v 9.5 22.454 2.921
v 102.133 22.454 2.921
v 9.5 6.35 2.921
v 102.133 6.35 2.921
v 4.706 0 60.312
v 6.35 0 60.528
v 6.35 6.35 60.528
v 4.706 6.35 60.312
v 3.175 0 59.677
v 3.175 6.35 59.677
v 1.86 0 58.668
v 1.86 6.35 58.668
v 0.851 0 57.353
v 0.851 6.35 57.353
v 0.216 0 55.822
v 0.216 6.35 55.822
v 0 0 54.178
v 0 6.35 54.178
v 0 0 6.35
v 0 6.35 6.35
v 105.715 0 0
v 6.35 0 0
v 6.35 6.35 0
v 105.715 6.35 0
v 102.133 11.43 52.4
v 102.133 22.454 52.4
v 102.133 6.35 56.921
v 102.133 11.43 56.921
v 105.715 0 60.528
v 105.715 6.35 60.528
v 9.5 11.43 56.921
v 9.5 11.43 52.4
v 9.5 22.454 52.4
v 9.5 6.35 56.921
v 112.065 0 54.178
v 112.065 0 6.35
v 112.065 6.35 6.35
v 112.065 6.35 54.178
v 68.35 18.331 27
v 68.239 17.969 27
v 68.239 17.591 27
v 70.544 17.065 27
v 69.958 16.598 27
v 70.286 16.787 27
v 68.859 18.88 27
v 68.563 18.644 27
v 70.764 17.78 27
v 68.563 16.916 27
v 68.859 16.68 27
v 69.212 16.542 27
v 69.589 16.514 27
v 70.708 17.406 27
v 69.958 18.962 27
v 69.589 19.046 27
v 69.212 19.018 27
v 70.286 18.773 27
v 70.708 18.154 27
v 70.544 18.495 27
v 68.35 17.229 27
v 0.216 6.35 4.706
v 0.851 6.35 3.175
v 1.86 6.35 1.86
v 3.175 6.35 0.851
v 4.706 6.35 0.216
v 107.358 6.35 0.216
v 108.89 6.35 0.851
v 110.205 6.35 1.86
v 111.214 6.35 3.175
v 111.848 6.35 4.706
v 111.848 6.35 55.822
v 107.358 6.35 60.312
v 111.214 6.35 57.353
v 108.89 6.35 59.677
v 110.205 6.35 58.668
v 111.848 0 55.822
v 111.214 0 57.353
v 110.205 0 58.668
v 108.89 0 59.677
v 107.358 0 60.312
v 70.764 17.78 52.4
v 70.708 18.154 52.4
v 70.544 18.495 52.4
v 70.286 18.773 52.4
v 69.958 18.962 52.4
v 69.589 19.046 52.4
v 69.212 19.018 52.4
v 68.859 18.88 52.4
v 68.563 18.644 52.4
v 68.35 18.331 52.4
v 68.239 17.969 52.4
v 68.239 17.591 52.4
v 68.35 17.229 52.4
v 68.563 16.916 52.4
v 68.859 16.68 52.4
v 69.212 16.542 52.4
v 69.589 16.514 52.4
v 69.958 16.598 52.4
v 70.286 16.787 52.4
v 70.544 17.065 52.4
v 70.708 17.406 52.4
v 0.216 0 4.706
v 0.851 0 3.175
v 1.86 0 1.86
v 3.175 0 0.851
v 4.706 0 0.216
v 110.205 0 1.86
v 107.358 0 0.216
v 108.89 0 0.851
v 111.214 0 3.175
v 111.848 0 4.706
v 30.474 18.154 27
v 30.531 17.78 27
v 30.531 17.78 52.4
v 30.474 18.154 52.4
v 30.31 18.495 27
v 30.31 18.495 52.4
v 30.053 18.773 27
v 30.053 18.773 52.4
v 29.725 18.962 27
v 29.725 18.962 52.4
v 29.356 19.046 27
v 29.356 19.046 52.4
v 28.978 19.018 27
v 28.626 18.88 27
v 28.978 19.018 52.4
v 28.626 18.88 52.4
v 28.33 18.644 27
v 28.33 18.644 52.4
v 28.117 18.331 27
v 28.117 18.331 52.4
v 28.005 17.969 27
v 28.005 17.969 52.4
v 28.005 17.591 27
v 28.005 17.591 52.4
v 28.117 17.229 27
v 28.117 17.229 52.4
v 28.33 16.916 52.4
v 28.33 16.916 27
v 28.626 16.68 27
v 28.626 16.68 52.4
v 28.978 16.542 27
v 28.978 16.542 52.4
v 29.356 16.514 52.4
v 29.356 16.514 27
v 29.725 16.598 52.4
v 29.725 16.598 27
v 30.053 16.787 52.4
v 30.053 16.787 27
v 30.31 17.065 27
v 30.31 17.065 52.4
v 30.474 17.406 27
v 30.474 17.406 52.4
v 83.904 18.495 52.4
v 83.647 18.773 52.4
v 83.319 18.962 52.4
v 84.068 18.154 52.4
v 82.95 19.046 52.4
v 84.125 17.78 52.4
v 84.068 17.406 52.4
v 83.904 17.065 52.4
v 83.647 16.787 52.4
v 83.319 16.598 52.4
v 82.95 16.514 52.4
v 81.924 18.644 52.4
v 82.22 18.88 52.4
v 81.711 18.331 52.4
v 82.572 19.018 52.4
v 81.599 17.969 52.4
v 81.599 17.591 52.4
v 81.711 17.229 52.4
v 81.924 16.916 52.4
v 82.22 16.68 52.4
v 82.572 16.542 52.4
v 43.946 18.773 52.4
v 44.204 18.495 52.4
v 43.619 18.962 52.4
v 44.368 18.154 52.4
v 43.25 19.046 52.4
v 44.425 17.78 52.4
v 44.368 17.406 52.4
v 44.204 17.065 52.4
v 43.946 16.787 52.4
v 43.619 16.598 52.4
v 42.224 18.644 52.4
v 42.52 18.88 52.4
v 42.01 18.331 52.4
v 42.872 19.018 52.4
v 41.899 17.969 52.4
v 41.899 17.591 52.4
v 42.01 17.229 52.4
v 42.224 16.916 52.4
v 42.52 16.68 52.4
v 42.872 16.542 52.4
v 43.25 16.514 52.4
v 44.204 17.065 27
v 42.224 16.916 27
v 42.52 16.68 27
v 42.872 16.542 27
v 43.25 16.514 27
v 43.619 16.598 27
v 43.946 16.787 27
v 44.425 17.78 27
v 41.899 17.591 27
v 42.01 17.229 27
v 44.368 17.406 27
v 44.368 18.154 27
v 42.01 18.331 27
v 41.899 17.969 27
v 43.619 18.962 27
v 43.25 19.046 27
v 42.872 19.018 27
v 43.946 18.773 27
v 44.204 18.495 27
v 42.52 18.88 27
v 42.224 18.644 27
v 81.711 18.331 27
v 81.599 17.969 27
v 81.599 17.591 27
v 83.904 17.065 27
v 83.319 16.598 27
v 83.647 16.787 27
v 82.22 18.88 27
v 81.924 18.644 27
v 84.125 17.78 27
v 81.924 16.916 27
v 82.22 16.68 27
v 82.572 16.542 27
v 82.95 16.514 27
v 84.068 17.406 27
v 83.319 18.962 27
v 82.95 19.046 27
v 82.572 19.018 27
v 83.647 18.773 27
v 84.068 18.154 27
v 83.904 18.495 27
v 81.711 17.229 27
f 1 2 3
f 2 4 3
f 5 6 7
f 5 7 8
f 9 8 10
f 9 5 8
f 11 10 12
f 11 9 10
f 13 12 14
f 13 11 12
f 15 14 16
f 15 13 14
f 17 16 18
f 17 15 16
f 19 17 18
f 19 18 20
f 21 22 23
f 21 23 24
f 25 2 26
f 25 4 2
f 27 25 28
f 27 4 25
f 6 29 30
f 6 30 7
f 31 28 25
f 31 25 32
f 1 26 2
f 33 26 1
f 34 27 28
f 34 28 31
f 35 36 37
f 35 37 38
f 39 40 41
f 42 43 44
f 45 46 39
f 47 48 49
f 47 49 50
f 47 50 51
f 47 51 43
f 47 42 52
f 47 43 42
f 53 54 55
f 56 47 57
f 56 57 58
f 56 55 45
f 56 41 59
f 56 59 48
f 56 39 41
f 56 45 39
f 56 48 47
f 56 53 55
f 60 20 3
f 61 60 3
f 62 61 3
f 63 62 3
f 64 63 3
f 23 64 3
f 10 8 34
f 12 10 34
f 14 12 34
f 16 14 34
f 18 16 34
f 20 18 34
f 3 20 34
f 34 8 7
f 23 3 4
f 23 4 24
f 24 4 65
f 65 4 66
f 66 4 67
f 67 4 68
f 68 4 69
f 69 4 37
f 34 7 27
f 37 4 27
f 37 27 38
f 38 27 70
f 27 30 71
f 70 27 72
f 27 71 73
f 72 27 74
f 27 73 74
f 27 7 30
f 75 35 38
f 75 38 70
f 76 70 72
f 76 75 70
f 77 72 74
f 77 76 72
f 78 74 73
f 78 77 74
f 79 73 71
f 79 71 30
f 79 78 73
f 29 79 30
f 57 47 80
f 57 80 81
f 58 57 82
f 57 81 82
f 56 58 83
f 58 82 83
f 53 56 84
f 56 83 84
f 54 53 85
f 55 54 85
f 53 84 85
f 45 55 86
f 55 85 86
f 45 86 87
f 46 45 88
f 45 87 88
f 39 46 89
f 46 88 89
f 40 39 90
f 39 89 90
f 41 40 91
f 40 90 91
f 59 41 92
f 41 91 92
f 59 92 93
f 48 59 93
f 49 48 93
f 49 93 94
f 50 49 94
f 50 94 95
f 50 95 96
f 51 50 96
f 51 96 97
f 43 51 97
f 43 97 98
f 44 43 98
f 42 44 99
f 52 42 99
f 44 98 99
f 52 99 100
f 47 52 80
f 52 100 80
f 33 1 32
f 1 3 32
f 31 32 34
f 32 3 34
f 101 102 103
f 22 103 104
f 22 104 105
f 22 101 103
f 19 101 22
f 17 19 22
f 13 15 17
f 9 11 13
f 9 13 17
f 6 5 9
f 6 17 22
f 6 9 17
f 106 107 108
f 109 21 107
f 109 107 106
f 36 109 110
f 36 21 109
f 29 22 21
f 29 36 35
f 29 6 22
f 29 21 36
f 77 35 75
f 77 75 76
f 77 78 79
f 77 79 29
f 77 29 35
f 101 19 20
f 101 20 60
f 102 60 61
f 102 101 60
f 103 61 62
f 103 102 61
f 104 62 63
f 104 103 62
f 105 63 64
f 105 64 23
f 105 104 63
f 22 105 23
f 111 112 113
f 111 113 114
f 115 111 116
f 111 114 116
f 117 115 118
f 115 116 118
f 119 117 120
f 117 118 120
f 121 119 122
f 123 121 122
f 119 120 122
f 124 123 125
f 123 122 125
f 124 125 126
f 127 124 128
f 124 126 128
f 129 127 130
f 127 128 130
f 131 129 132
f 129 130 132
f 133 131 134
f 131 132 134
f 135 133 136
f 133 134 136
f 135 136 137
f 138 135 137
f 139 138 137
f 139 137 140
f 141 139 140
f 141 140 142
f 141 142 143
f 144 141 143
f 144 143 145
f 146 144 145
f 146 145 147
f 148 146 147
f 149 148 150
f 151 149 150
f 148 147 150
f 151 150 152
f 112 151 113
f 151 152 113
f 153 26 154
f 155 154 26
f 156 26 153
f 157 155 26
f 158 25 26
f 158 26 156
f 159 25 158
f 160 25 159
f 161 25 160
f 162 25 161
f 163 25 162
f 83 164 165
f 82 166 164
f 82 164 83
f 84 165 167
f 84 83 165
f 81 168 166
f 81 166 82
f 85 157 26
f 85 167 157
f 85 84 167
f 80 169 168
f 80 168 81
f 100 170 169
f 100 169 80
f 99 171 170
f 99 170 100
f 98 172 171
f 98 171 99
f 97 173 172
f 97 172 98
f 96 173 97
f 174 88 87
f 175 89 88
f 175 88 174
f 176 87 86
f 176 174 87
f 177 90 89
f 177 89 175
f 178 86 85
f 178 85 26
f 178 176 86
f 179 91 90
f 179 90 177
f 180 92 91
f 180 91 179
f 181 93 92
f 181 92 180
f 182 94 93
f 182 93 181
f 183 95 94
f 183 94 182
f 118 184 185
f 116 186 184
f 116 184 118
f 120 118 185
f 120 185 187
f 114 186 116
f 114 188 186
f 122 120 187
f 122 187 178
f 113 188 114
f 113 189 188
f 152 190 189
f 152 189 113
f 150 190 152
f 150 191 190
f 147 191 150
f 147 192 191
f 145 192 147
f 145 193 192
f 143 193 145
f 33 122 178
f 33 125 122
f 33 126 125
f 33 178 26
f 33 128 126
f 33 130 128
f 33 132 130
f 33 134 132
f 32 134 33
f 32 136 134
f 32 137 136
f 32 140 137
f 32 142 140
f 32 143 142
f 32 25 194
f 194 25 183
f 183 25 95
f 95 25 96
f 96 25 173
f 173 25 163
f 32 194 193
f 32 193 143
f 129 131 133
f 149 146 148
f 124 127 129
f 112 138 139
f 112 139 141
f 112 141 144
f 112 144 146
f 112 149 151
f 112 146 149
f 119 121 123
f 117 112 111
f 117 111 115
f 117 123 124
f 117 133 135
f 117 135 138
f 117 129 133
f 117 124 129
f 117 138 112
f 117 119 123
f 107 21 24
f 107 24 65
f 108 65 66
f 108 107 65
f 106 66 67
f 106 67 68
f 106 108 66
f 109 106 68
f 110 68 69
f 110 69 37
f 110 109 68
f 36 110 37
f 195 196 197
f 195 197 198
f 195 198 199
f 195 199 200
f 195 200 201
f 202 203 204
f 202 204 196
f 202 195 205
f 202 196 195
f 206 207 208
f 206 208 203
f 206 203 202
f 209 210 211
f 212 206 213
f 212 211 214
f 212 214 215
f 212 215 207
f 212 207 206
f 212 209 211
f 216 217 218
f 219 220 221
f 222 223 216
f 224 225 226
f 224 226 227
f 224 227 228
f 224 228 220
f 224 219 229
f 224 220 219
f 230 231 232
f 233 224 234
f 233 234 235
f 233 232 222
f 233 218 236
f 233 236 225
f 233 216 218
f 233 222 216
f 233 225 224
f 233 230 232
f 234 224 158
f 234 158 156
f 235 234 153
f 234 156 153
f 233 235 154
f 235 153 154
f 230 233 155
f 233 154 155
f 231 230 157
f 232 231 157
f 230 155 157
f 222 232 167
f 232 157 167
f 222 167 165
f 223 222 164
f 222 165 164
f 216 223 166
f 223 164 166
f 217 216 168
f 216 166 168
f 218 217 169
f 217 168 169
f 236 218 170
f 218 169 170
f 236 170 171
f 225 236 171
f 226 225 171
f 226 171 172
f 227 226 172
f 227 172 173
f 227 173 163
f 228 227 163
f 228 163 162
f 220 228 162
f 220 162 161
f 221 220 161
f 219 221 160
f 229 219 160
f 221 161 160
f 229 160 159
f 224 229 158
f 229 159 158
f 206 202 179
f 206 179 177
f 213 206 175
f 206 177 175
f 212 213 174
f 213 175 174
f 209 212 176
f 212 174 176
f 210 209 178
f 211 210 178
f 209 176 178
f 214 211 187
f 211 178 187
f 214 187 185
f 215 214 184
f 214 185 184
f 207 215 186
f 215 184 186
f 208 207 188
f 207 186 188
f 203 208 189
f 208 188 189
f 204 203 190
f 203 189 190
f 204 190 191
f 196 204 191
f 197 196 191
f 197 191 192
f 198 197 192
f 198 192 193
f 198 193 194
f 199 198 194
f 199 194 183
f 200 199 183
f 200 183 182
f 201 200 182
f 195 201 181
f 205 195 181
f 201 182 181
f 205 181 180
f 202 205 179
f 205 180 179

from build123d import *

# Parameters (mm, degrees)
F1_DEPTH = 6.35
F2_W     = 92.6338
F2_H     = 54.0004
F3_DEPTH = 5.08
F4_W     = 92.6338
F4_H     = 49.4792
F5_DEPTH = 11.0236
F6_R     = 1.27
F7_DEPTH = 25.4


with BuildPart() as f1:
    # F0 (on Front) → F1 (new body)
    with BuildSketch(Plane.XZ):
        with BuildLine():
            ThreePointArc((0, 6.35), (1.859872, 1.859872), (6.35, 0))
            Line((6.35, 0), (105.7148, 0))
            ThreePointArc((105.7148, 0), (110.204928, 1.859872), (112.0648, 6.35))
            Line((112.0648, 6.35), (112.0648, 54.1782))
            ThreePointArc((112.0648, 54.1782), (110.204928, 58.668328), (105.7148, 60.5282))
            Line((105.7148, 60.5282), (6.35, 60.5282))
            ThreePointArc((6.35, 60.5282), (1.859872, 58.668328), (0, 54.1782))
            Line((0, 54.1782), (0, 6.35))
        make_face()
    extrude(amount=-F1_DEPTH)

    # F2 (on face) → F3 (join)
    with BuildSketch(Plane(origin=(0, 6.35, 0), x_dir=(-1, 0, 0), z_dir=(0, 1, 0))):
        with Locations((-55.8165, 29.9212)):
            Rectangle(F2_W, F2_H)
    extrude(amount=F3_DEPTH)

    # F4 (on face) → F5 (join)
    with BuildSketch(Plane(origin=(0, 11.43, 0), x_dir=(-1, 0, 0), z_dir=(0, 1, 0))):
        with Locations((-55.8165, 27.6606)):
            Rectangle(F4_W, F4_H)
    extrude(amount=F5_DEPTH)

    # F6 (on face) → F7 (cut)
    with BuildSketch(Plane.XY.offset(52.4002)):
        with Locations((29.2608, 17.78)):
            Circle(F6_R)
        with Locations((43.1546, 17.78)):
            Circle(F6_R)
        with Locations((69.4944, 17.78)):
            Circle(F6_R)
        with Locations((82.8548, 17.78)):
            Circle(F6_R)
    extrude(amount=-F7_DEPTH, mode=Mode.SUBTRACT)


solid = f1.part
